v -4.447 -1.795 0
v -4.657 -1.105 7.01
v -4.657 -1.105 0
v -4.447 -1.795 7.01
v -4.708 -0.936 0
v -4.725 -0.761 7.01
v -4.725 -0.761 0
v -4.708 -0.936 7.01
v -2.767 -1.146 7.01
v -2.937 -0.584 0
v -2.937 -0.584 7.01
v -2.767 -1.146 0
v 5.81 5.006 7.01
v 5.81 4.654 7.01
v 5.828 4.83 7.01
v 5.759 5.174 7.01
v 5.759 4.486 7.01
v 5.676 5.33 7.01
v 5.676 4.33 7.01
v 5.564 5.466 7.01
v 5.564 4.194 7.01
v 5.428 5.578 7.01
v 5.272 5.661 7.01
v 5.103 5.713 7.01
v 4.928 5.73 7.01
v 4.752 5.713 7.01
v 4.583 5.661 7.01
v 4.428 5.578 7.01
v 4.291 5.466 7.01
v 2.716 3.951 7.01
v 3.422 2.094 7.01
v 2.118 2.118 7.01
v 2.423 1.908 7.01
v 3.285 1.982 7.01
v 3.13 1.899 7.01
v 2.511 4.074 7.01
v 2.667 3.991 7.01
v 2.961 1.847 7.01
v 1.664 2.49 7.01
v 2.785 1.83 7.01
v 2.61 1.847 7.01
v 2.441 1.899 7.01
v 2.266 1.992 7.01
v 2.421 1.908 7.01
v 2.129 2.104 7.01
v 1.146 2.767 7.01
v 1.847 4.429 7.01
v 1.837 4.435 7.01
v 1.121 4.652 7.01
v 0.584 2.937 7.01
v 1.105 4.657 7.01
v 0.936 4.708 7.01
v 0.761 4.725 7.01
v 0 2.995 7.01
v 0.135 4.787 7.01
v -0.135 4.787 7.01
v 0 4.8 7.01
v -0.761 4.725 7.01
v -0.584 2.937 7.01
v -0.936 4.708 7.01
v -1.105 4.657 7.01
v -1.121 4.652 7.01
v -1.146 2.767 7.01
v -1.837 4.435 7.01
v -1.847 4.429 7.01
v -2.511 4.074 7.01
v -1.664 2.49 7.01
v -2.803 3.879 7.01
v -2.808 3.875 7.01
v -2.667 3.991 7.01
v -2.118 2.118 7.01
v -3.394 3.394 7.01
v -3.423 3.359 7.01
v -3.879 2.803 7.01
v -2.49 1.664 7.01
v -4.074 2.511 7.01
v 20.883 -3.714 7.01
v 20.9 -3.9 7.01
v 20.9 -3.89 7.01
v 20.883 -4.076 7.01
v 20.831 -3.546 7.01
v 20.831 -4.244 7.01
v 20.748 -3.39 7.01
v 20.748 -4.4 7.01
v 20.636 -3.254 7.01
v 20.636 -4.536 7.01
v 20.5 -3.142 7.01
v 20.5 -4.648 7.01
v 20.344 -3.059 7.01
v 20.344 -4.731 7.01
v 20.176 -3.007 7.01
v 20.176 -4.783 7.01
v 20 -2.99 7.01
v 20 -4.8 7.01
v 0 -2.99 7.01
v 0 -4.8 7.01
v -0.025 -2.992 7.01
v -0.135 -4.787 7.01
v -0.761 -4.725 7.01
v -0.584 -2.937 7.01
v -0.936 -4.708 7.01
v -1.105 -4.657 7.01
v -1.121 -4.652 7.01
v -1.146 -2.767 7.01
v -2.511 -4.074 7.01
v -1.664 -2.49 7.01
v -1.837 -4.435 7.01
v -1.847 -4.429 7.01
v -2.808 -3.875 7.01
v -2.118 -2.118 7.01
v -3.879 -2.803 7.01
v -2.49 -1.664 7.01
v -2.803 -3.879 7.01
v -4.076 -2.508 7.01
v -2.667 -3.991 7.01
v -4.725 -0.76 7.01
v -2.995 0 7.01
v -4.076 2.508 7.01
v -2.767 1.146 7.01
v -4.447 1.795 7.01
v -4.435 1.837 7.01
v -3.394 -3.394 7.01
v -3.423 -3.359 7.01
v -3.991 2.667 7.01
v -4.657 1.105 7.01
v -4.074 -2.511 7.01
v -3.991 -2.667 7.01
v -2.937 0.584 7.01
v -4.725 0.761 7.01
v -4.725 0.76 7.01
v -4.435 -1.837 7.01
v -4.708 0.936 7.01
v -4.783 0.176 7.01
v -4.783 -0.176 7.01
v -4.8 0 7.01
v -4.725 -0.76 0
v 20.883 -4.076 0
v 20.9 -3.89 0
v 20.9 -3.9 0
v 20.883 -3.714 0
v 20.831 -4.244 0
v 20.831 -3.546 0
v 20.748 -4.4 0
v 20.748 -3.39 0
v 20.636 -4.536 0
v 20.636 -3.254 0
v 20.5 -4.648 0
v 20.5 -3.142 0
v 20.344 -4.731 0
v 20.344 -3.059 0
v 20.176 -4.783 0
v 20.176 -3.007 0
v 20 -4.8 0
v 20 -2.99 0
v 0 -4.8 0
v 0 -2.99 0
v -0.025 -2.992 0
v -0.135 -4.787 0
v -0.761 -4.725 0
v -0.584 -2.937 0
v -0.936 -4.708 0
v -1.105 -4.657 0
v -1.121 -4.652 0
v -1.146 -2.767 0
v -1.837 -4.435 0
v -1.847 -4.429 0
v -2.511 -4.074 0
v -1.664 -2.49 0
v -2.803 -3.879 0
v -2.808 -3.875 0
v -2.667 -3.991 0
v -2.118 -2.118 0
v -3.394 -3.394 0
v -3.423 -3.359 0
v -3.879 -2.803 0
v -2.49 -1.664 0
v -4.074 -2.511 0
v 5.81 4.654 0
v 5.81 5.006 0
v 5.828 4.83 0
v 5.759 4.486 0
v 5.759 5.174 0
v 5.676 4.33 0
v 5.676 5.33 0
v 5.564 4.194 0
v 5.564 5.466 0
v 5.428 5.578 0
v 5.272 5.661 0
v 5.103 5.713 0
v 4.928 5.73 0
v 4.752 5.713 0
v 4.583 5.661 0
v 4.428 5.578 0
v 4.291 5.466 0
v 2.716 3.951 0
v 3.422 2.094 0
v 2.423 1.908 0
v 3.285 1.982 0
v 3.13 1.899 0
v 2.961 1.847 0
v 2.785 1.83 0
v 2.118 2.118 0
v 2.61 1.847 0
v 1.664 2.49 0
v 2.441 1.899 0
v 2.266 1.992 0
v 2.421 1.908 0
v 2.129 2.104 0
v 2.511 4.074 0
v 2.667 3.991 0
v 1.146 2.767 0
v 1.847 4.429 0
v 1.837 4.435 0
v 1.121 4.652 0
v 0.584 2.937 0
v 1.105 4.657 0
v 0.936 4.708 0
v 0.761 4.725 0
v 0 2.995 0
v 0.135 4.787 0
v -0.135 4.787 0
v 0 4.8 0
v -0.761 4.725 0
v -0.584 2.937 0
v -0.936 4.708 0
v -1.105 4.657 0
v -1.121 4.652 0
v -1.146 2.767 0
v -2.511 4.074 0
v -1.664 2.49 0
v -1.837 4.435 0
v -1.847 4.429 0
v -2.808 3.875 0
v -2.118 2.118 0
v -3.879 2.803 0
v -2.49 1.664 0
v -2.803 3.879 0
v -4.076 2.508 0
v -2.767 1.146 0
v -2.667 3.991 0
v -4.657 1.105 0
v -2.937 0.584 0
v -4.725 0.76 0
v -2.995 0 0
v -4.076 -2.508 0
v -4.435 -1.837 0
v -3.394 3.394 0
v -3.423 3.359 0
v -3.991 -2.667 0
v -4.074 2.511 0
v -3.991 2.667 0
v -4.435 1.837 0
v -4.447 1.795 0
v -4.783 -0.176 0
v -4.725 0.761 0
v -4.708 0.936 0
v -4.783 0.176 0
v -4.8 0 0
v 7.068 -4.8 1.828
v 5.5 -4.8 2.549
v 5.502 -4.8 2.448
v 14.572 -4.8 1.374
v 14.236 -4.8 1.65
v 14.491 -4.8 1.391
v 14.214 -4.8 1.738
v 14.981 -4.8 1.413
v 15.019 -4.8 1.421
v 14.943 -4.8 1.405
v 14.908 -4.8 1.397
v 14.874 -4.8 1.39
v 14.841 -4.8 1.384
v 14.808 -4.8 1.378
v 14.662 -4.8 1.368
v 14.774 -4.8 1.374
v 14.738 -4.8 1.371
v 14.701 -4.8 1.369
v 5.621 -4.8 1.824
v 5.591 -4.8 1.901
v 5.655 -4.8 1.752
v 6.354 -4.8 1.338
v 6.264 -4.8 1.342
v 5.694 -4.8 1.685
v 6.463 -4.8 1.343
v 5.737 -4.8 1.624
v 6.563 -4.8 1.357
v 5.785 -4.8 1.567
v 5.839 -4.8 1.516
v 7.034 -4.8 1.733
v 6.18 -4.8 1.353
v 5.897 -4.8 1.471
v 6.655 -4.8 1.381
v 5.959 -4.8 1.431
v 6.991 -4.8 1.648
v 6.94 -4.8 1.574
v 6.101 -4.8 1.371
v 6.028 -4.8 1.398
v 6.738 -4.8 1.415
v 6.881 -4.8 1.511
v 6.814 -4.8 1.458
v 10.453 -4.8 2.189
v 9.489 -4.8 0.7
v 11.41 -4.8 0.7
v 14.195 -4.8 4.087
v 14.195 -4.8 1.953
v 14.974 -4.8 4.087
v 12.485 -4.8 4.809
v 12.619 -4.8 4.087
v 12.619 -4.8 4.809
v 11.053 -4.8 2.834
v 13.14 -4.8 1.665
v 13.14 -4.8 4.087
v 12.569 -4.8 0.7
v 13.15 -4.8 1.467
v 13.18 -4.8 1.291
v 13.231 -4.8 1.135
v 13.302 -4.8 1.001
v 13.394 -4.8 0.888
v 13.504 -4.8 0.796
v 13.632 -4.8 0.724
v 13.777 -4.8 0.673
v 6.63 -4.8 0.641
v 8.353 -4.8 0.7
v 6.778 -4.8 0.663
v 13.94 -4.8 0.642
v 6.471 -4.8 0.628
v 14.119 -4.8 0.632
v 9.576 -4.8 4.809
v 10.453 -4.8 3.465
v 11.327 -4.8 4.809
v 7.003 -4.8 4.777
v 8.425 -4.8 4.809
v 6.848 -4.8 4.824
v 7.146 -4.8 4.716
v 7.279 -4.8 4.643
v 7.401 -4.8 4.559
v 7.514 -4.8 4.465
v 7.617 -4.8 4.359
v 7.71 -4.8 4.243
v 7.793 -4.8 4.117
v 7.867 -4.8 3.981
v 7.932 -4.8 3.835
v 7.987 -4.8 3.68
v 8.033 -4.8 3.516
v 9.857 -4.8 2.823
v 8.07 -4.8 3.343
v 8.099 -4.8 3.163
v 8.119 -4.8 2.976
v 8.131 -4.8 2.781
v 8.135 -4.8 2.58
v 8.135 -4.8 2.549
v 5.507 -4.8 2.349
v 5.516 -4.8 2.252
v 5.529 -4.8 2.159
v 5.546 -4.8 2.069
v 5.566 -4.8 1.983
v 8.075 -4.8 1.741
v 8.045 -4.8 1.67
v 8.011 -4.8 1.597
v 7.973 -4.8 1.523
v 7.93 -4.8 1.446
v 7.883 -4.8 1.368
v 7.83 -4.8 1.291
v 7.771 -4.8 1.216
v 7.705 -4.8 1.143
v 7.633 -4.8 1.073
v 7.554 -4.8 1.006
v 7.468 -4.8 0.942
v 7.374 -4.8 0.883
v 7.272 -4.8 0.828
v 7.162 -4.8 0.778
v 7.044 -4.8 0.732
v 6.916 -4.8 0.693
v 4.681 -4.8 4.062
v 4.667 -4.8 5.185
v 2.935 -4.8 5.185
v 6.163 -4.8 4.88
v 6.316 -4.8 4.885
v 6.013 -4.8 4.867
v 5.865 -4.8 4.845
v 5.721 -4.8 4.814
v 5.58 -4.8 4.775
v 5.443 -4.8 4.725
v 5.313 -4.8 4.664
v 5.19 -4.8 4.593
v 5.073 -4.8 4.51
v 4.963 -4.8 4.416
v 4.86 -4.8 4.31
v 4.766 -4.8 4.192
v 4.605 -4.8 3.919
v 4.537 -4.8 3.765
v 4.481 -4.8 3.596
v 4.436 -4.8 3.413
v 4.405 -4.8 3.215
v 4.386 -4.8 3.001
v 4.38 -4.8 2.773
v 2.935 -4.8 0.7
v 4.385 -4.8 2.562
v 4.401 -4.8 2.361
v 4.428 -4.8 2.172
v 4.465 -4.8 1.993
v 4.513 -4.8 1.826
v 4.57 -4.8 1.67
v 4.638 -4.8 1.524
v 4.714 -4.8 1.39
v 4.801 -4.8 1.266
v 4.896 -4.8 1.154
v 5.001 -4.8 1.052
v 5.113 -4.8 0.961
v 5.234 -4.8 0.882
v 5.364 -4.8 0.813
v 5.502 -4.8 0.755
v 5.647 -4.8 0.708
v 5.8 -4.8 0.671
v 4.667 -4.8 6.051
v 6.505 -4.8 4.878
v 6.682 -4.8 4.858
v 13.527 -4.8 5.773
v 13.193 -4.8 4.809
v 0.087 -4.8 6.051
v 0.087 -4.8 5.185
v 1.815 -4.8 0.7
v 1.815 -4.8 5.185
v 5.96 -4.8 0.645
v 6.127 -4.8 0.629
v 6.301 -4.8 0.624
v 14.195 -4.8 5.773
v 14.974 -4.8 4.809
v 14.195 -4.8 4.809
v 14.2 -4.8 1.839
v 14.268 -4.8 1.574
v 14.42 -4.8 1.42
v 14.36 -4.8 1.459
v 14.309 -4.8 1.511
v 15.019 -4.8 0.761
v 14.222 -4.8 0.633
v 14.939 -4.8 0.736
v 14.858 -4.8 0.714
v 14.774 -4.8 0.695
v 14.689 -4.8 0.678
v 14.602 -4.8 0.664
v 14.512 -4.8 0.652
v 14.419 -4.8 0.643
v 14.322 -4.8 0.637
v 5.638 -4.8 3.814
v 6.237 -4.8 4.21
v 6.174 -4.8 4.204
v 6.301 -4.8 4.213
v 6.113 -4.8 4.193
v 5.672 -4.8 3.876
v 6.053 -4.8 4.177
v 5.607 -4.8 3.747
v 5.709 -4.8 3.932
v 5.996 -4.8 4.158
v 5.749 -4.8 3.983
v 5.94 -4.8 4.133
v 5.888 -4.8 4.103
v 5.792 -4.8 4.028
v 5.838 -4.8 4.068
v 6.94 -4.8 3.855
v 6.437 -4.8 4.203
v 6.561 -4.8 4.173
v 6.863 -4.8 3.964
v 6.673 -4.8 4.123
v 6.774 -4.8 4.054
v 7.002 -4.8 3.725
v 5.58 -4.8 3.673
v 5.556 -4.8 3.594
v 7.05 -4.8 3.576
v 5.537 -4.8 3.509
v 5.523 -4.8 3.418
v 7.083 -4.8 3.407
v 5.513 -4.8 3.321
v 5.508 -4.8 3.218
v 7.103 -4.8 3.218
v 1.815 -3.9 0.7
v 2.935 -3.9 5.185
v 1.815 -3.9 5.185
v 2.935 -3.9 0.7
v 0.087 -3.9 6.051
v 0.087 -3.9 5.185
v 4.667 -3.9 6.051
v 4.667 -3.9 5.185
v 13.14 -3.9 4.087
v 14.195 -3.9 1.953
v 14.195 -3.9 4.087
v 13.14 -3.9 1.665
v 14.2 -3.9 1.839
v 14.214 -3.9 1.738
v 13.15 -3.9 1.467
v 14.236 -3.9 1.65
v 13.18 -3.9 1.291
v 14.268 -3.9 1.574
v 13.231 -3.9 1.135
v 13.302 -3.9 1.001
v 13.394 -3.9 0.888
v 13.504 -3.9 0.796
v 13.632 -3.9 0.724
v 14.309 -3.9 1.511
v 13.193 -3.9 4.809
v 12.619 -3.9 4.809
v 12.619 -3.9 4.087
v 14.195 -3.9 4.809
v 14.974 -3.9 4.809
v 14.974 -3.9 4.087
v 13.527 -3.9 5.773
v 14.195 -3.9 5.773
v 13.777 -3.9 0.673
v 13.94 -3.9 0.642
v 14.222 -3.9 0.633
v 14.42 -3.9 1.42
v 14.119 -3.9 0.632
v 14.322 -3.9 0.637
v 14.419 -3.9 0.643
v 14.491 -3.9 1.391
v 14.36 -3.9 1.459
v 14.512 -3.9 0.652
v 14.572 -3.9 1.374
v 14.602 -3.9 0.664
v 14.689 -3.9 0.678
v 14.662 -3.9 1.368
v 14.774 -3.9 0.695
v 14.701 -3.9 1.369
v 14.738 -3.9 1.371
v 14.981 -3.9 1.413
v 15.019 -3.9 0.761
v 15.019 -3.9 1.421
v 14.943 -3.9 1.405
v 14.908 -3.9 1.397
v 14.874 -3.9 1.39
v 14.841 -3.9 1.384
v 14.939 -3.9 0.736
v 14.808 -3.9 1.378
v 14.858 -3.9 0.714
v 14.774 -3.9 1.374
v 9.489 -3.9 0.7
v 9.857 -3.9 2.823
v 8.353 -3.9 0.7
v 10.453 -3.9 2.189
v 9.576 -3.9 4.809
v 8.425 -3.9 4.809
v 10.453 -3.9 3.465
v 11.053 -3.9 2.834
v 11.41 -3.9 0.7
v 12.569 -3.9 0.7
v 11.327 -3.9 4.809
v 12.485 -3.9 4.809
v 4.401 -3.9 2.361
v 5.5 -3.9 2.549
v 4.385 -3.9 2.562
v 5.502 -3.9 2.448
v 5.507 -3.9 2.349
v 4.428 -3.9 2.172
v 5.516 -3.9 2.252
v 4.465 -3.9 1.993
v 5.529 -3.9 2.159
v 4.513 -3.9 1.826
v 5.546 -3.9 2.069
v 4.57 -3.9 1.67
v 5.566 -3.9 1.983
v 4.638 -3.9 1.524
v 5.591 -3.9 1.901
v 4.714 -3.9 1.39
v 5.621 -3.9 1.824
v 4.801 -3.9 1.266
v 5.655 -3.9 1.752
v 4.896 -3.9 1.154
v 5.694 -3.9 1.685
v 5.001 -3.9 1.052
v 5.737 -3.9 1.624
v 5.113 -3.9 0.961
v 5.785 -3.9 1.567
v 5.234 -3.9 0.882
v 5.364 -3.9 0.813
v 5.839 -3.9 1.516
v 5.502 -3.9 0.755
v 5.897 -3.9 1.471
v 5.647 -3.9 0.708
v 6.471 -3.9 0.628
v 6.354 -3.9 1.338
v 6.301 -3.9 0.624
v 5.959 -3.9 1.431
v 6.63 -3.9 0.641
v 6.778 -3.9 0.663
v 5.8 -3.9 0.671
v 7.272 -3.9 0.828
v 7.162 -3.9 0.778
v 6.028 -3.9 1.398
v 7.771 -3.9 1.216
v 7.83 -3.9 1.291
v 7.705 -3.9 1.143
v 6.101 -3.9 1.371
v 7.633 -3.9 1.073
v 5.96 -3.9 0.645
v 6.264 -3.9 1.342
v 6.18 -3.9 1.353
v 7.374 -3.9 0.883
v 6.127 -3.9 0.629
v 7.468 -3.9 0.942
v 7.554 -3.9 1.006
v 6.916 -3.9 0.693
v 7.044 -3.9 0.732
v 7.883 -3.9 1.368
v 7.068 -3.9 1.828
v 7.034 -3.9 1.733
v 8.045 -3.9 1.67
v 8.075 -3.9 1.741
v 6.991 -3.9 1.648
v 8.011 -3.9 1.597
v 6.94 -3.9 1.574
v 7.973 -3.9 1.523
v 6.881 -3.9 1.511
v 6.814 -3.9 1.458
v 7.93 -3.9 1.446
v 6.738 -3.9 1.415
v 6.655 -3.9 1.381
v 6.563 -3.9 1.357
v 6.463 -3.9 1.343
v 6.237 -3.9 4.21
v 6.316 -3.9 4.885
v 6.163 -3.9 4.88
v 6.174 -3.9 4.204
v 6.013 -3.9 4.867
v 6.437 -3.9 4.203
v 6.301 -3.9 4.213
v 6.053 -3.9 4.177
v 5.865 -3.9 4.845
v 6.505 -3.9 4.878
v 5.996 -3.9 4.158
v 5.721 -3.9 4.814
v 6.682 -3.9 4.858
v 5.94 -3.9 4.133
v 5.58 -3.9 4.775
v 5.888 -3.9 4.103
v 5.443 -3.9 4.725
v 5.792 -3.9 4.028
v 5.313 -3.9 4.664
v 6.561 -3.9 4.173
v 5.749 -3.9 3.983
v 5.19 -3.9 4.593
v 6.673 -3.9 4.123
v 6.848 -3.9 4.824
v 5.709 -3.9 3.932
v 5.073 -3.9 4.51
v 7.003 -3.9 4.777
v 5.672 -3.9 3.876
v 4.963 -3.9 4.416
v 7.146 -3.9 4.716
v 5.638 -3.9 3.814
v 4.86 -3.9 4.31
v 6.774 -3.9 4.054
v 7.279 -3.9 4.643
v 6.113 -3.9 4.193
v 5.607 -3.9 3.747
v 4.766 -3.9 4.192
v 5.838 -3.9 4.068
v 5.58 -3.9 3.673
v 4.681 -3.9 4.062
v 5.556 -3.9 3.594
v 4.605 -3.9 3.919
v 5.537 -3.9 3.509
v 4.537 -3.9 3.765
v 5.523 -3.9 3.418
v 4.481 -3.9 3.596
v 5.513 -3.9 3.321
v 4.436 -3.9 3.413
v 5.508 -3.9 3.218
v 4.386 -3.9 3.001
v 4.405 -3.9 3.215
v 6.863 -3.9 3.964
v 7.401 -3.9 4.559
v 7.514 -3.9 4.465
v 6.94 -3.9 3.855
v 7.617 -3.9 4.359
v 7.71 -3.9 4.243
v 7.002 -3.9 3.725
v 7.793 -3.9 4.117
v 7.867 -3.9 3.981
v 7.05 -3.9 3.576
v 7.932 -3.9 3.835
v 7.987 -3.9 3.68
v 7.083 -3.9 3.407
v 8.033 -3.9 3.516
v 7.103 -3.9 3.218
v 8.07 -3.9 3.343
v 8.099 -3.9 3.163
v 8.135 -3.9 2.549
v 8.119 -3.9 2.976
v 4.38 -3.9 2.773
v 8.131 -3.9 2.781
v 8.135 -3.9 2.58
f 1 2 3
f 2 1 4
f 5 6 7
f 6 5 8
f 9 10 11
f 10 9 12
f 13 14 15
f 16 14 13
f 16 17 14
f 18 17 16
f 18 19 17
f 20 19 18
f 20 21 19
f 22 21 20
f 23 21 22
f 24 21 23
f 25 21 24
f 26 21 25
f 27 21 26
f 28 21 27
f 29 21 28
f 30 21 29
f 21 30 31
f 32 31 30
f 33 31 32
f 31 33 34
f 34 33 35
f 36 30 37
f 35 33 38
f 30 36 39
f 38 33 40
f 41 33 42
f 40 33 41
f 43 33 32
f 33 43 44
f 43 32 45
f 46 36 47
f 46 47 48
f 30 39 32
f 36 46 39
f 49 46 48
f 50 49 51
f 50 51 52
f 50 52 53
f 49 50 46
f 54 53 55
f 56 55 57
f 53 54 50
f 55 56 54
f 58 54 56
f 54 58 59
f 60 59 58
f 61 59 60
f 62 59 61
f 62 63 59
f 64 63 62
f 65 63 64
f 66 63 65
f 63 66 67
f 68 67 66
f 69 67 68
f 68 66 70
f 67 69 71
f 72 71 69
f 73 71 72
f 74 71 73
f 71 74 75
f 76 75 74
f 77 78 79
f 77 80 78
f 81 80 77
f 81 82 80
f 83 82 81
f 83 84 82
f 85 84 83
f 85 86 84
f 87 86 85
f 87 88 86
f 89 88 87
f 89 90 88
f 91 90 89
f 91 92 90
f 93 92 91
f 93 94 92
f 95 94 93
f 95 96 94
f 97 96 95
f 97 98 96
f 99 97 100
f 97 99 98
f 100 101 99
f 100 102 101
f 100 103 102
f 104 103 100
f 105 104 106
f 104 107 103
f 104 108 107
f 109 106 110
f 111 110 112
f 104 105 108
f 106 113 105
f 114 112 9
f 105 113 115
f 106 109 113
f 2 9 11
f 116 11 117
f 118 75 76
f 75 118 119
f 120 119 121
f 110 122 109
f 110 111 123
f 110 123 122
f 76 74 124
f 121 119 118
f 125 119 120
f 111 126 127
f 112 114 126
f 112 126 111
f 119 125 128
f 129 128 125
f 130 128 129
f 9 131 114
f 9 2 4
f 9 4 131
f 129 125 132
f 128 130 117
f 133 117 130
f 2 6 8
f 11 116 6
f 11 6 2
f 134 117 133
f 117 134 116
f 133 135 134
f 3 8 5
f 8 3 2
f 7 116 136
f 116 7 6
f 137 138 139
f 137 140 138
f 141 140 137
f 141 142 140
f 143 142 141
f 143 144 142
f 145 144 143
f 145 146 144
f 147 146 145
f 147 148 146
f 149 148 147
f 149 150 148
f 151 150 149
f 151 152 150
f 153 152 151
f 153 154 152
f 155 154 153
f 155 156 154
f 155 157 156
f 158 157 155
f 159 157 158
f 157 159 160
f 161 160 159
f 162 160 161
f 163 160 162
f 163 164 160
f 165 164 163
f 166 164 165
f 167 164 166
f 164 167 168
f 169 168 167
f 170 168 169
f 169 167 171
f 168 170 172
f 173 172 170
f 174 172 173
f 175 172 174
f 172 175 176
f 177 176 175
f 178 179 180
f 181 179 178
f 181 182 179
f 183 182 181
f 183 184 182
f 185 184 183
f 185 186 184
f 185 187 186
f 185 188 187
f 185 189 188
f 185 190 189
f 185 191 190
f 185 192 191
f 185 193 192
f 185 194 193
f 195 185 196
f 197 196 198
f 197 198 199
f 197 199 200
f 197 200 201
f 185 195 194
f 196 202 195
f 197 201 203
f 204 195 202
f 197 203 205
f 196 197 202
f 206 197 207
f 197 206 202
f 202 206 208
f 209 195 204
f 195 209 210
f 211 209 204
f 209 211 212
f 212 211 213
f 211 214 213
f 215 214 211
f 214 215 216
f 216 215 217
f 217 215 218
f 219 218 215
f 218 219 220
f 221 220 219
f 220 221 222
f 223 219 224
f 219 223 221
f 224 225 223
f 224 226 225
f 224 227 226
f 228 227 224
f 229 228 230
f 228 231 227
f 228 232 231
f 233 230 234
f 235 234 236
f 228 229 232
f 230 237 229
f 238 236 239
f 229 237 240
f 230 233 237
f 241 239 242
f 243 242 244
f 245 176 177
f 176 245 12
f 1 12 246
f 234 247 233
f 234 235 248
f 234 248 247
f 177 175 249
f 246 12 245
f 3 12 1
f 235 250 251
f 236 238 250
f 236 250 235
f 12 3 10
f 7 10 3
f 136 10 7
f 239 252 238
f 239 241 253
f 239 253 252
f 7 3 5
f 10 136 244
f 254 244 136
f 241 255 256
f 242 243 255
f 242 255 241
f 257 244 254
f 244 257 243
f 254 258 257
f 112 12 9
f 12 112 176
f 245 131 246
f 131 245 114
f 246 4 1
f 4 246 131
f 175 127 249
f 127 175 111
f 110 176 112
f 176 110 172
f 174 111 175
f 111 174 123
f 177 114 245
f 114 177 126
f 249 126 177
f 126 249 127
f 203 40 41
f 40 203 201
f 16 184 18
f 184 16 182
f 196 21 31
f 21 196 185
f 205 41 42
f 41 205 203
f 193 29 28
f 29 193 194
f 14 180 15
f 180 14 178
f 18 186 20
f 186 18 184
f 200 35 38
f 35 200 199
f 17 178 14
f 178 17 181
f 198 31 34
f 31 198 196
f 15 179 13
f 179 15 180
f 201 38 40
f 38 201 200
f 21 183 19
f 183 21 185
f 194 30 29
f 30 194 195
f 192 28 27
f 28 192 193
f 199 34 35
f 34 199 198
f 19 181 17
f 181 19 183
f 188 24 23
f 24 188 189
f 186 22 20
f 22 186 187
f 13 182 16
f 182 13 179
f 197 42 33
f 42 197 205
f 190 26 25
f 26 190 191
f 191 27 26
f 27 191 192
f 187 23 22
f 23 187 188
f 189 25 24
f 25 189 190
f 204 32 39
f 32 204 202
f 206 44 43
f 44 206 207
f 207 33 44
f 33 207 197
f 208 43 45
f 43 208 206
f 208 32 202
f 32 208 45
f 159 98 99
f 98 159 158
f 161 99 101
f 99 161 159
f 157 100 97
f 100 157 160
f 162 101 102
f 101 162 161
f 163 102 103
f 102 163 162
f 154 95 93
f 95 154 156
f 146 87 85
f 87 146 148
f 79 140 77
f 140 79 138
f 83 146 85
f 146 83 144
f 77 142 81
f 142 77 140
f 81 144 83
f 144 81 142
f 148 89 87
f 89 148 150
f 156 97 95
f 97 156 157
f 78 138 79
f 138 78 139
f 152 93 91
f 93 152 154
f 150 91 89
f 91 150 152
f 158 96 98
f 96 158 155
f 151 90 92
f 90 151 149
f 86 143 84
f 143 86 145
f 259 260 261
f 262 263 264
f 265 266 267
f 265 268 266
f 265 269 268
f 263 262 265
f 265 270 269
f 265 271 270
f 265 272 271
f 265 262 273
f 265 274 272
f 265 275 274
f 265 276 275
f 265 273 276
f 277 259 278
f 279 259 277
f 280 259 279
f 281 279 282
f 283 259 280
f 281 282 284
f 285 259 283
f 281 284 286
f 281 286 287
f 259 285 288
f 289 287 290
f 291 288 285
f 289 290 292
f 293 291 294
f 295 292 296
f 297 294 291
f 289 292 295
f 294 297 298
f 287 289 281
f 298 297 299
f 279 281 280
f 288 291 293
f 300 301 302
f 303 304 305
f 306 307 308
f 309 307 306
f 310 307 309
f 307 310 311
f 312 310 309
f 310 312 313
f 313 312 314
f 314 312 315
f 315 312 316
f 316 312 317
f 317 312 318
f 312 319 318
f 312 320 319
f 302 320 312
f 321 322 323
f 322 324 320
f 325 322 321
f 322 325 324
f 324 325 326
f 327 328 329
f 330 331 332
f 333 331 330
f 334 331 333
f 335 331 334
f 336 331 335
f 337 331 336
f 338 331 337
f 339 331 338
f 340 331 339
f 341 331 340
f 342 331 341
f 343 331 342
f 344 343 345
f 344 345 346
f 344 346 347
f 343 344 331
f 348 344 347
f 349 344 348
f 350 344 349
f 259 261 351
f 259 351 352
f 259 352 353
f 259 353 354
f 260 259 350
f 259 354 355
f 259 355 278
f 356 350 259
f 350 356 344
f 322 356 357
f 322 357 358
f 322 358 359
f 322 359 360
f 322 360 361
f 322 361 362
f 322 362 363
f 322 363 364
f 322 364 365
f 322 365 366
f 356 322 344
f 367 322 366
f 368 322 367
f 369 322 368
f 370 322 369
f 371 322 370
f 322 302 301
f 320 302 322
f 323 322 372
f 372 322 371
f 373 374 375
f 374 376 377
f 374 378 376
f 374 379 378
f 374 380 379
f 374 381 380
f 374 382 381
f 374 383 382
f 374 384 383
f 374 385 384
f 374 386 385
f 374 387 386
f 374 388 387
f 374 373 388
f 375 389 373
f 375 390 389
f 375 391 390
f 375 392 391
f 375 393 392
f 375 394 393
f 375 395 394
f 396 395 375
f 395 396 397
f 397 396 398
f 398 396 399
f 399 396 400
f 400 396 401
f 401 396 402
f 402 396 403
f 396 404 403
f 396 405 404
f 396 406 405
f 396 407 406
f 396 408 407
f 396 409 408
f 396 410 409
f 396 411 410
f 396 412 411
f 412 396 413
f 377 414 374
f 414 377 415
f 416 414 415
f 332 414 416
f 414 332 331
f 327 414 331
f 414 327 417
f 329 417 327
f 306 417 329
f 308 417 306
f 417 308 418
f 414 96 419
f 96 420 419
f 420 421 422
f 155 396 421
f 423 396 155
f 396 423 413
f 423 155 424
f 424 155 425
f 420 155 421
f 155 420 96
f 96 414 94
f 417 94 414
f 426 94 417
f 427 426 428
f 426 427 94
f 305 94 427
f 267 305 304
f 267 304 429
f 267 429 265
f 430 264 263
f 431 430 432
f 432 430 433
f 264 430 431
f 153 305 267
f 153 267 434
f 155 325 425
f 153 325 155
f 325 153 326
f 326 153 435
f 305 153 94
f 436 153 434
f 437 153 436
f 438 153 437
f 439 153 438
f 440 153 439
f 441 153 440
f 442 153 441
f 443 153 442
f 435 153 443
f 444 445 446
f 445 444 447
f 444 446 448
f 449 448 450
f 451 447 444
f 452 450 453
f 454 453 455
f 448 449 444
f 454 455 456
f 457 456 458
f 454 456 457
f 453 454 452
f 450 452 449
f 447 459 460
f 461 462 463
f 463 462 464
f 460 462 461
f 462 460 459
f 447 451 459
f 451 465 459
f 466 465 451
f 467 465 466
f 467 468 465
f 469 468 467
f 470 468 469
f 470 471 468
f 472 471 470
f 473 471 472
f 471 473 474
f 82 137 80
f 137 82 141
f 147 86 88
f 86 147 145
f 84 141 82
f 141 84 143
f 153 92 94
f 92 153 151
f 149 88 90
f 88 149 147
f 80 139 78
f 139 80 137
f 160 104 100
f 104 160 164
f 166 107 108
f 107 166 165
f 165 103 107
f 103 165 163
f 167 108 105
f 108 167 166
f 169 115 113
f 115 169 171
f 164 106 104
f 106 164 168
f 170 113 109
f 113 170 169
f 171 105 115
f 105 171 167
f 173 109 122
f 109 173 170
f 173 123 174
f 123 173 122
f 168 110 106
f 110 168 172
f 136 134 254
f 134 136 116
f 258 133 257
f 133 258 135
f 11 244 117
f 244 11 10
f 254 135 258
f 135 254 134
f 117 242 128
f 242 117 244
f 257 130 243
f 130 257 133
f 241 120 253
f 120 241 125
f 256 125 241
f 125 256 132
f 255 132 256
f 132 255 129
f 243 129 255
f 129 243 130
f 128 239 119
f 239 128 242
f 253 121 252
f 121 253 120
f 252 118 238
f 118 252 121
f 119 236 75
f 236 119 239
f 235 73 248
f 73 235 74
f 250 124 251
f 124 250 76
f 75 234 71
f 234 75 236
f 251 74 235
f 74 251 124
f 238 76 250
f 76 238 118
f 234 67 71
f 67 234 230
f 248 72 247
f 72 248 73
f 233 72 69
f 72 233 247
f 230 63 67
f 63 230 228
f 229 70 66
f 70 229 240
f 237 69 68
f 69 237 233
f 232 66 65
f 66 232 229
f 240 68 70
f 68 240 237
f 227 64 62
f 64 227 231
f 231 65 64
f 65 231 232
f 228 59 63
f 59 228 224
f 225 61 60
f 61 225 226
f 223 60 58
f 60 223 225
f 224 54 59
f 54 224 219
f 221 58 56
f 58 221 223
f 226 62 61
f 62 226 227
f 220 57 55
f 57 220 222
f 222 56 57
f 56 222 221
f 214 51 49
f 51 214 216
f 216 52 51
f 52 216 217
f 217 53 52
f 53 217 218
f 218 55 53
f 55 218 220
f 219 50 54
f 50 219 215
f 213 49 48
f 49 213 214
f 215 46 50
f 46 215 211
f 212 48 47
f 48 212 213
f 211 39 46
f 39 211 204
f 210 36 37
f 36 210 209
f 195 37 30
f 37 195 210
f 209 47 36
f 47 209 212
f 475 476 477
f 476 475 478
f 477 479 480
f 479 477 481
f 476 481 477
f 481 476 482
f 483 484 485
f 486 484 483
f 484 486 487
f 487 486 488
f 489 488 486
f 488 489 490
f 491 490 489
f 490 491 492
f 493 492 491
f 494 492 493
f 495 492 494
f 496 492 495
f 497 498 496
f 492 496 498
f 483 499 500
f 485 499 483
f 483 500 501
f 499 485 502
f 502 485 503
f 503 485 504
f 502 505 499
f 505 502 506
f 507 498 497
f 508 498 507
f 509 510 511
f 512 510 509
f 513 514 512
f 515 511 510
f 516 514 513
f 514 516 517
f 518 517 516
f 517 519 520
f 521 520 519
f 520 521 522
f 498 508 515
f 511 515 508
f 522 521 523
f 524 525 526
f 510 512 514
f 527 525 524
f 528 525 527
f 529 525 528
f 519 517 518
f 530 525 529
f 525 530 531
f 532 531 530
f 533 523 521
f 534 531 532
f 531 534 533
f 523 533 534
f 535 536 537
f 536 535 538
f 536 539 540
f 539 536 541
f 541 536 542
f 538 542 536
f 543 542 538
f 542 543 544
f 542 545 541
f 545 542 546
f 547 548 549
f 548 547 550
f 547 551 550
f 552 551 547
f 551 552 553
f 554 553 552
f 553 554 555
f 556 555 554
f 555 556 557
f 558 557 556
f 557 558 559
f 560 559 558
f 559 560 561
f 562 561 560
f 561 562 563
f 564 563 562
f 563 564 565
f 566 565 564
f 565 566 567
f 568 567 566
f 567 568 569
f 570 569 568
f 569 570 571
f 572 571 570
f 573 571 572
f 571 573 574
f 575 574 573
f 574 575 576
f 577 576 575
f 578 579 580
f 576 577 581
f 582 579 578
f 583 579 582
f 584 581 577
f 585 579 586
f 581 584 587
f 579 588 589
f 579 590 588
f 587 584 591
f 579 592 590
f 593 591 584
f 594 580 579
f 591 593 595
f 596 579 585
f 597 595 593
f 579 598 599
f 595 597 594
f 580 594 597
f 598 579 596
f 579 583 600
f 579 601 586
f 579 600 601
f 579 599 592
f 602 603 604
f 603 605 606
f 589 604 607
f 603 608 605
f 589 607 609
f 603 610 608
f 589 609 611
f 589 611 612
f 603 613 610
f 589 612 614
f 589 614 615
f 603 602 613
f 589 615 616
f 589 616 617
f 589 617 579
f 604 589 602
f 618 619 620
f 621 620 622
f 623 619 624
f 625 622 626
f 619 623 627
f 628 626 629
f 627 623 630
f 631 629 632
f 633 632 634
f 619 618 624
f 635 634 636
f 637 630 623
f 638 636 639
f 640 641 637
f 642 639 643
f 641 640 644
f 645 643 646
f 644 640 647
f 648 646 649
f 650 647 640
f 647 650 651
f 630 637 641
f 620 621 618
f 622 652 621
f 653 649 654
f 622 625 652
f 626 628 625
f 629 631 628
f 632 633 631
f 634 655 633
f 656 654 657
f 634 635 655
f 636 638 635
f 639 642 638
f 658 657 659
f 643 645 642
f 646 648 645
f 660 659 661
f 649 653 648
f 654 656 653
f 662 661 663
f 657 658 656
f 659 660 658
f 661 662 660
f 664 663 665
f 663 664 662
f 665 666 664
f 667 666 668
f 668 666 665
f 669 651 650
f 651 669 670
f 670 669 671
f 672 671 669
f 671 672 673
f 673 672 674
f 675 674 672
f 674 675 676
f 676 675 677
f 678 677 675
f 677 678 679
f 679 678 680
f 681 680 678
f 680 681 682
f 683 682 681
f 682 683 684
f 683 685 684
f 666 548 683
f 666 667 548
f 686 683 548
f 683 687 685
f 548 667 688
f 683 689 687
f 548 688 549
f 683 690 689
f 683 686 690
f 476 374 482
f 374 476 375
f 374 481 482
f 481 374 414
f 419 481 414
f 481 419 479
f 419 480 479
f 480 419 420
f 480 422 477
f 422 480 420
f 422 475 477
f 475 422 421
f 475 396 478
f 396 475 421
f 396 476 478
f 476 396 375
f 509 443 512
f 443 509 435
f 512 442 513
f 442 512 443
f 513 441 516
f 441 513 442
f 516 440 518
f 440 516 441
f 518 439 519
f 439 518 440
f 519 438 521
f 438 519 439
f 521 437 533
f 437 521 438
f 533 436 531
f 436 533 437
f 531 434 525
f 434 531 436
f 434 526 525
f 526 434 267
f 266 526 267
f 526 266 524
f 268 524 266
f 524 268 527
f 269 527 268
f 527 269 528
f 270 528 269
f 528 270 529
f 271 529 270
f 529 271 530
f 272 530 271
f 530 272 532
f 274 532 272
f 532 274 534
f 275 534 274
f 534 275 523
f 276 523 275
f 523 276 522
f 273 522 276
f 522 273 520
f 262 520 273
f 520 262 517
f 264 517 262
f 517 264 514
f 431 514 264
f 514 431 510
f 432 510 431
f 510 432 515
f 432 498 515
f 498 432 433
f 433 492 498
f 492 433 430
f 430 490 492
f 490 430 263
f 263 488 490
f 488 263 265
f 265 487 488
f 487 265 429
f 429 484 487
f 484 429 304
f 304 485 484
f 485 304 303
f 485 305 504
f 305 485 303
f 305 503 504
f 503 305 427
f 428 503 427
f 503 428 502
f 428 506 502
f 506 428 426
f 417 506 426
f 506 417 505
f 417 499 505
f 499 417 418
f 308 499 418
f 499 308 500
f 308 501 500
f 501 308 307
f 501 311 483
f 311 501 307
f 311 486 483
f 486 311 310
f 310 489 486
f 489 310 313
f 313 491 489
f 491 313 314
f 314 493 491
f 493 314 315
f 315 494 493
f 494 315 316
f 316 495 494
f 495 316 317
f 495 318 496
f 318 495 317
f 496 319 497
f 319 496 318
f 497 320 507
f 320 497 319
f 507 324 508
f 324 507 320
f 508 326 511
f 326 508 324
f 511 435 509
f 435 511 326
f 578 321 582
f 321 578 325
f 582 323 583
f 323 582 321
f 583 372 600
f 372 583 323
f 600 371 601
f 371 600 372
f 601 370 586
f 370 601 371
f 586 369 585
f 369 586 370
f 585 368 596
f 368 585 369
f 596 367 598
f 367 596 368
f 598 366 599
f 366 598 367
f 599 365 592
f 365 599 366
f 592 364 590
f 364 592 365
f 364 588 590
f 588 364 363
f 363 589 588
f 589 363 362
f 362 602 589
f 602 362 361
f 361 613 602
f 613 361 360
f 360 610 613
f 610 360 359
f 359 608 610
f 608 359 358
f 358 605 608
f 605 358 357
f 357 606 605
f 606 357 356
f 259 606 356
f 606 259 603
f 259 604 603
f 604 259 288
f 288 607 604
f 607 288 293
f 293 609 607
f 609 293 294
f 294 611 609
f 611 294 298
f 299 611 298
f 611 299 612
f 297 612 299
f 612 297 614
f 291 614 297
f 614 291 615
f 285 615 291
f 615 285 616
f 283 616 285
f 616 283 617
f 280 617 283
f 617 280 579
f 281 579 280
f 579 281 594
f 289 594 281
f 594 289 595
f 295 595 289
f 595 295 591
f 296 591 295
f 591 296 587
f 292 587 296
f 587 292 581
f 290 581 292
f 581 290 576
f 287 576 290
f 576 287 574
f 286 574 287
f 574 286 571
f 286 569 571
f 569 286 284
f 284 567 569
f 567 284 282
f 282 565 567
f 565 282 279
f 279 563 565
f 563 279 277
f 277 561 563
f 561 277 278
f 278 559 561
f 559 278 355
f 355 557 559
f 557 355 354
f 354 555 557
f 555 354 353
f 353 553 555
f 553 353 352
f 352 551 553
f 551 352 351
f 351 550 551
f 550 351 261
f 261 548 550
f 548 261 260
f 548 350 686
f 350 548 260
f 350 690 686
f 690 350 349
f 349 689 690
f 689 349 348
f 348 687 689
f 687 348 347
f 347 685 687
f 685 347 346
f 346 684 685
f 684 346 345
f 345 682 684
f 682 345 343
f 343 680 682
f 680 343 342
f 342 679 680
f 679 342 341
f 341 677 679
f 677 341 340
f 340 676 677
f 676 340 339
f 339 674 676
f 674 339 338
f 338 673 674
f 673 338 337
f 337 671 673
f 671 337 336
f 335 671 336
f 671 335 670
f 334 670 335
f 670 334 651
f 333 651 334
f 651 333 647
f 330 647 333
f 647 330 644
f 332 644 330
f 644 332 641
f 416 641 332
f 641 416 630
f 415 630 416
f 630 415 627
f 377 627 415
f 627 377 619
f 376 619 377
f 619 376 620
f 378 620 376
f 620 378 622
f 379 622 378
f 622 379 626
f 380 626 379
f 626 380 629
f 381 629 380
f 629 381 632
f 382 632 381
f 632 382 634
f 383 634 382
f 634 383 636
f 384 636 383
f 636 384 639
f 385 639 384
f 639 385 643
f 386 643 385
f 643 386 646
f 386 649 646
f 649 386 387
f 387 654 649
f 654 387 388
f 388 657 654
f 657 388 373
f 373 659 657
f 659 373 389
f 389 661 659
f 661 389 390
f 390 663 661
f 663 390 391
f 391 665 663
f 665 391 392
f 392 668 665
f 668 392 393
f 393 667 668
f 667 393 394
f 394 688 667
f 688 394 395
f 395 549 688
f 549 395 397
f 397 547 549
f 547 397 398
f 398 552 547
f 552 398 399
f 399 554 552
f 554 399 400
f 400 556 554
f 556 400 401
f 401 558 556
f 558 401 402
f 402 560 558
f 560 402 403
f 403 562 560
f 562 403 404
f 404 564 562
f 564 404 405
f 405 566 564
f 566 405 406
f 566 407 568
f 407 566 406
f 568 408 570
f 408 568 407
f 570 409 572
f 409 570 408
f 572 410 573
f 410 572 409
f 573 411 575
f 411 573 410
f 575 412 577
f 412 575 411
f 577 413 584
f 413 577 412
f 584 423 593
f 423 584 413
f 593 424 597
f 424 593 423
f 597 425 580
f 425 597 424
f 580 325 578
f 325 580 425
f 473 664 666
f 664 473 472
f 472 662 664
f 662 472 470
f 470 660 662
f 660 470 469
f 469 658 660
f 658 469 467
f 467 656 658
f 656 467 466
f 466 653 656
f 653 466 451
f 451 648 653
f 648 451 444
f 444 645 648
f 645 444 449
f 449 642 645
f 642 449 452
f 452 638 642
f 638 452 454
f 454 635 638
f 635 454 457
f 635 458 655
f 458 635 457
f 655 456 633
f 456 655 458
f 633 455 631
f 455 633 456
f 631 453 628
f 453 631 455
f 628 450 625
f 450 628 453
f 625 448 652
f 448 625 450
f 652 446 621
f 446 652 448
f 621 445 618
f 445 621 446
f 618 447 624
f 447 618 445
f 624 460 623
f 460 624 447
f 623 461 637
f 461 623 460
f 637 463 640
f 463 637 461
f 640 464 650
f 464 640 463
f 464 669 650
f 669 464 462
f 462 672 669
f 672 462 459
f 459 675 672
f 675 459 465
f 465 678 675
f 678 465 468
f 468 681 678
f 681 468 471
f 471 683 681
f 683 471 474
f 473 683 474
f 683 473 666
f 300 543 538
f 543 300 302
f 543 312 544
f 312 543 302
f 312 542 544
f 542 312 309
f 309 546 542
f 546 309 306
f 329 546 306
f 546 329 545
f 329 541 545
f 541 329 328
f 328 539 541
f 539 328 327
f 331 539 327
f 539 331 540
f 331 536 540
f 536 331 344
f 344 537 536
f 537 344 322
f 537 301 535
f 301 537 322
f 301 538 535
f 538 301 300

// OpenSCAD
cable_diameter = 6;		// [1:0.5:20]
height = 7;				// [5:1:30]
string = "Text";
tag_width = 20;			// [10:1:50]


/* [Extra] */

thickness = 1.8;			// [0.5:0.1:3]
gap_ratio = 0.85;		// [0.5:0.025:0.95]
hook_length = 3;		// [0:1:10]
text_height_ratio = 0.8;// [0.5:0.1:1]


/* [Hidden] */

$fn = 32;
e = 0.01;


difference()
{
	diam = cable_diameter + thickness;
	minkowski()
	{
		linear_extrude(height=e)
		{
			union()
			{
				difference()
				{
					circle(d=diam);
					circle(d=diam-e);
					translate([0, -diam/2+e]) square([diam/2+e, diam * gap_ratio]);
				}
				translate([0, -diam/2]) square([tag_width, e]);
				hookY = (gap_ratio-0.5)*2;
				hookX = sqrt(1-hookY*hookY);
				polygon(points = [diam/2 * [hookX, hookY], (diam/2 + hook_length) * [hookX, hookY], diam/2 * [hookX, hookY+e]]);
				
			}
		}
		
		cylinder(height, d=thickness);
	}	

	translate([0, -diam/2, height * (1-text_height_ratio)/2]) rotate([90, 0, 0]) linear_extrude(height = thickness) text(string, font="Liberation Sans:style=Bold", size = height * text_height_ratio);
}
